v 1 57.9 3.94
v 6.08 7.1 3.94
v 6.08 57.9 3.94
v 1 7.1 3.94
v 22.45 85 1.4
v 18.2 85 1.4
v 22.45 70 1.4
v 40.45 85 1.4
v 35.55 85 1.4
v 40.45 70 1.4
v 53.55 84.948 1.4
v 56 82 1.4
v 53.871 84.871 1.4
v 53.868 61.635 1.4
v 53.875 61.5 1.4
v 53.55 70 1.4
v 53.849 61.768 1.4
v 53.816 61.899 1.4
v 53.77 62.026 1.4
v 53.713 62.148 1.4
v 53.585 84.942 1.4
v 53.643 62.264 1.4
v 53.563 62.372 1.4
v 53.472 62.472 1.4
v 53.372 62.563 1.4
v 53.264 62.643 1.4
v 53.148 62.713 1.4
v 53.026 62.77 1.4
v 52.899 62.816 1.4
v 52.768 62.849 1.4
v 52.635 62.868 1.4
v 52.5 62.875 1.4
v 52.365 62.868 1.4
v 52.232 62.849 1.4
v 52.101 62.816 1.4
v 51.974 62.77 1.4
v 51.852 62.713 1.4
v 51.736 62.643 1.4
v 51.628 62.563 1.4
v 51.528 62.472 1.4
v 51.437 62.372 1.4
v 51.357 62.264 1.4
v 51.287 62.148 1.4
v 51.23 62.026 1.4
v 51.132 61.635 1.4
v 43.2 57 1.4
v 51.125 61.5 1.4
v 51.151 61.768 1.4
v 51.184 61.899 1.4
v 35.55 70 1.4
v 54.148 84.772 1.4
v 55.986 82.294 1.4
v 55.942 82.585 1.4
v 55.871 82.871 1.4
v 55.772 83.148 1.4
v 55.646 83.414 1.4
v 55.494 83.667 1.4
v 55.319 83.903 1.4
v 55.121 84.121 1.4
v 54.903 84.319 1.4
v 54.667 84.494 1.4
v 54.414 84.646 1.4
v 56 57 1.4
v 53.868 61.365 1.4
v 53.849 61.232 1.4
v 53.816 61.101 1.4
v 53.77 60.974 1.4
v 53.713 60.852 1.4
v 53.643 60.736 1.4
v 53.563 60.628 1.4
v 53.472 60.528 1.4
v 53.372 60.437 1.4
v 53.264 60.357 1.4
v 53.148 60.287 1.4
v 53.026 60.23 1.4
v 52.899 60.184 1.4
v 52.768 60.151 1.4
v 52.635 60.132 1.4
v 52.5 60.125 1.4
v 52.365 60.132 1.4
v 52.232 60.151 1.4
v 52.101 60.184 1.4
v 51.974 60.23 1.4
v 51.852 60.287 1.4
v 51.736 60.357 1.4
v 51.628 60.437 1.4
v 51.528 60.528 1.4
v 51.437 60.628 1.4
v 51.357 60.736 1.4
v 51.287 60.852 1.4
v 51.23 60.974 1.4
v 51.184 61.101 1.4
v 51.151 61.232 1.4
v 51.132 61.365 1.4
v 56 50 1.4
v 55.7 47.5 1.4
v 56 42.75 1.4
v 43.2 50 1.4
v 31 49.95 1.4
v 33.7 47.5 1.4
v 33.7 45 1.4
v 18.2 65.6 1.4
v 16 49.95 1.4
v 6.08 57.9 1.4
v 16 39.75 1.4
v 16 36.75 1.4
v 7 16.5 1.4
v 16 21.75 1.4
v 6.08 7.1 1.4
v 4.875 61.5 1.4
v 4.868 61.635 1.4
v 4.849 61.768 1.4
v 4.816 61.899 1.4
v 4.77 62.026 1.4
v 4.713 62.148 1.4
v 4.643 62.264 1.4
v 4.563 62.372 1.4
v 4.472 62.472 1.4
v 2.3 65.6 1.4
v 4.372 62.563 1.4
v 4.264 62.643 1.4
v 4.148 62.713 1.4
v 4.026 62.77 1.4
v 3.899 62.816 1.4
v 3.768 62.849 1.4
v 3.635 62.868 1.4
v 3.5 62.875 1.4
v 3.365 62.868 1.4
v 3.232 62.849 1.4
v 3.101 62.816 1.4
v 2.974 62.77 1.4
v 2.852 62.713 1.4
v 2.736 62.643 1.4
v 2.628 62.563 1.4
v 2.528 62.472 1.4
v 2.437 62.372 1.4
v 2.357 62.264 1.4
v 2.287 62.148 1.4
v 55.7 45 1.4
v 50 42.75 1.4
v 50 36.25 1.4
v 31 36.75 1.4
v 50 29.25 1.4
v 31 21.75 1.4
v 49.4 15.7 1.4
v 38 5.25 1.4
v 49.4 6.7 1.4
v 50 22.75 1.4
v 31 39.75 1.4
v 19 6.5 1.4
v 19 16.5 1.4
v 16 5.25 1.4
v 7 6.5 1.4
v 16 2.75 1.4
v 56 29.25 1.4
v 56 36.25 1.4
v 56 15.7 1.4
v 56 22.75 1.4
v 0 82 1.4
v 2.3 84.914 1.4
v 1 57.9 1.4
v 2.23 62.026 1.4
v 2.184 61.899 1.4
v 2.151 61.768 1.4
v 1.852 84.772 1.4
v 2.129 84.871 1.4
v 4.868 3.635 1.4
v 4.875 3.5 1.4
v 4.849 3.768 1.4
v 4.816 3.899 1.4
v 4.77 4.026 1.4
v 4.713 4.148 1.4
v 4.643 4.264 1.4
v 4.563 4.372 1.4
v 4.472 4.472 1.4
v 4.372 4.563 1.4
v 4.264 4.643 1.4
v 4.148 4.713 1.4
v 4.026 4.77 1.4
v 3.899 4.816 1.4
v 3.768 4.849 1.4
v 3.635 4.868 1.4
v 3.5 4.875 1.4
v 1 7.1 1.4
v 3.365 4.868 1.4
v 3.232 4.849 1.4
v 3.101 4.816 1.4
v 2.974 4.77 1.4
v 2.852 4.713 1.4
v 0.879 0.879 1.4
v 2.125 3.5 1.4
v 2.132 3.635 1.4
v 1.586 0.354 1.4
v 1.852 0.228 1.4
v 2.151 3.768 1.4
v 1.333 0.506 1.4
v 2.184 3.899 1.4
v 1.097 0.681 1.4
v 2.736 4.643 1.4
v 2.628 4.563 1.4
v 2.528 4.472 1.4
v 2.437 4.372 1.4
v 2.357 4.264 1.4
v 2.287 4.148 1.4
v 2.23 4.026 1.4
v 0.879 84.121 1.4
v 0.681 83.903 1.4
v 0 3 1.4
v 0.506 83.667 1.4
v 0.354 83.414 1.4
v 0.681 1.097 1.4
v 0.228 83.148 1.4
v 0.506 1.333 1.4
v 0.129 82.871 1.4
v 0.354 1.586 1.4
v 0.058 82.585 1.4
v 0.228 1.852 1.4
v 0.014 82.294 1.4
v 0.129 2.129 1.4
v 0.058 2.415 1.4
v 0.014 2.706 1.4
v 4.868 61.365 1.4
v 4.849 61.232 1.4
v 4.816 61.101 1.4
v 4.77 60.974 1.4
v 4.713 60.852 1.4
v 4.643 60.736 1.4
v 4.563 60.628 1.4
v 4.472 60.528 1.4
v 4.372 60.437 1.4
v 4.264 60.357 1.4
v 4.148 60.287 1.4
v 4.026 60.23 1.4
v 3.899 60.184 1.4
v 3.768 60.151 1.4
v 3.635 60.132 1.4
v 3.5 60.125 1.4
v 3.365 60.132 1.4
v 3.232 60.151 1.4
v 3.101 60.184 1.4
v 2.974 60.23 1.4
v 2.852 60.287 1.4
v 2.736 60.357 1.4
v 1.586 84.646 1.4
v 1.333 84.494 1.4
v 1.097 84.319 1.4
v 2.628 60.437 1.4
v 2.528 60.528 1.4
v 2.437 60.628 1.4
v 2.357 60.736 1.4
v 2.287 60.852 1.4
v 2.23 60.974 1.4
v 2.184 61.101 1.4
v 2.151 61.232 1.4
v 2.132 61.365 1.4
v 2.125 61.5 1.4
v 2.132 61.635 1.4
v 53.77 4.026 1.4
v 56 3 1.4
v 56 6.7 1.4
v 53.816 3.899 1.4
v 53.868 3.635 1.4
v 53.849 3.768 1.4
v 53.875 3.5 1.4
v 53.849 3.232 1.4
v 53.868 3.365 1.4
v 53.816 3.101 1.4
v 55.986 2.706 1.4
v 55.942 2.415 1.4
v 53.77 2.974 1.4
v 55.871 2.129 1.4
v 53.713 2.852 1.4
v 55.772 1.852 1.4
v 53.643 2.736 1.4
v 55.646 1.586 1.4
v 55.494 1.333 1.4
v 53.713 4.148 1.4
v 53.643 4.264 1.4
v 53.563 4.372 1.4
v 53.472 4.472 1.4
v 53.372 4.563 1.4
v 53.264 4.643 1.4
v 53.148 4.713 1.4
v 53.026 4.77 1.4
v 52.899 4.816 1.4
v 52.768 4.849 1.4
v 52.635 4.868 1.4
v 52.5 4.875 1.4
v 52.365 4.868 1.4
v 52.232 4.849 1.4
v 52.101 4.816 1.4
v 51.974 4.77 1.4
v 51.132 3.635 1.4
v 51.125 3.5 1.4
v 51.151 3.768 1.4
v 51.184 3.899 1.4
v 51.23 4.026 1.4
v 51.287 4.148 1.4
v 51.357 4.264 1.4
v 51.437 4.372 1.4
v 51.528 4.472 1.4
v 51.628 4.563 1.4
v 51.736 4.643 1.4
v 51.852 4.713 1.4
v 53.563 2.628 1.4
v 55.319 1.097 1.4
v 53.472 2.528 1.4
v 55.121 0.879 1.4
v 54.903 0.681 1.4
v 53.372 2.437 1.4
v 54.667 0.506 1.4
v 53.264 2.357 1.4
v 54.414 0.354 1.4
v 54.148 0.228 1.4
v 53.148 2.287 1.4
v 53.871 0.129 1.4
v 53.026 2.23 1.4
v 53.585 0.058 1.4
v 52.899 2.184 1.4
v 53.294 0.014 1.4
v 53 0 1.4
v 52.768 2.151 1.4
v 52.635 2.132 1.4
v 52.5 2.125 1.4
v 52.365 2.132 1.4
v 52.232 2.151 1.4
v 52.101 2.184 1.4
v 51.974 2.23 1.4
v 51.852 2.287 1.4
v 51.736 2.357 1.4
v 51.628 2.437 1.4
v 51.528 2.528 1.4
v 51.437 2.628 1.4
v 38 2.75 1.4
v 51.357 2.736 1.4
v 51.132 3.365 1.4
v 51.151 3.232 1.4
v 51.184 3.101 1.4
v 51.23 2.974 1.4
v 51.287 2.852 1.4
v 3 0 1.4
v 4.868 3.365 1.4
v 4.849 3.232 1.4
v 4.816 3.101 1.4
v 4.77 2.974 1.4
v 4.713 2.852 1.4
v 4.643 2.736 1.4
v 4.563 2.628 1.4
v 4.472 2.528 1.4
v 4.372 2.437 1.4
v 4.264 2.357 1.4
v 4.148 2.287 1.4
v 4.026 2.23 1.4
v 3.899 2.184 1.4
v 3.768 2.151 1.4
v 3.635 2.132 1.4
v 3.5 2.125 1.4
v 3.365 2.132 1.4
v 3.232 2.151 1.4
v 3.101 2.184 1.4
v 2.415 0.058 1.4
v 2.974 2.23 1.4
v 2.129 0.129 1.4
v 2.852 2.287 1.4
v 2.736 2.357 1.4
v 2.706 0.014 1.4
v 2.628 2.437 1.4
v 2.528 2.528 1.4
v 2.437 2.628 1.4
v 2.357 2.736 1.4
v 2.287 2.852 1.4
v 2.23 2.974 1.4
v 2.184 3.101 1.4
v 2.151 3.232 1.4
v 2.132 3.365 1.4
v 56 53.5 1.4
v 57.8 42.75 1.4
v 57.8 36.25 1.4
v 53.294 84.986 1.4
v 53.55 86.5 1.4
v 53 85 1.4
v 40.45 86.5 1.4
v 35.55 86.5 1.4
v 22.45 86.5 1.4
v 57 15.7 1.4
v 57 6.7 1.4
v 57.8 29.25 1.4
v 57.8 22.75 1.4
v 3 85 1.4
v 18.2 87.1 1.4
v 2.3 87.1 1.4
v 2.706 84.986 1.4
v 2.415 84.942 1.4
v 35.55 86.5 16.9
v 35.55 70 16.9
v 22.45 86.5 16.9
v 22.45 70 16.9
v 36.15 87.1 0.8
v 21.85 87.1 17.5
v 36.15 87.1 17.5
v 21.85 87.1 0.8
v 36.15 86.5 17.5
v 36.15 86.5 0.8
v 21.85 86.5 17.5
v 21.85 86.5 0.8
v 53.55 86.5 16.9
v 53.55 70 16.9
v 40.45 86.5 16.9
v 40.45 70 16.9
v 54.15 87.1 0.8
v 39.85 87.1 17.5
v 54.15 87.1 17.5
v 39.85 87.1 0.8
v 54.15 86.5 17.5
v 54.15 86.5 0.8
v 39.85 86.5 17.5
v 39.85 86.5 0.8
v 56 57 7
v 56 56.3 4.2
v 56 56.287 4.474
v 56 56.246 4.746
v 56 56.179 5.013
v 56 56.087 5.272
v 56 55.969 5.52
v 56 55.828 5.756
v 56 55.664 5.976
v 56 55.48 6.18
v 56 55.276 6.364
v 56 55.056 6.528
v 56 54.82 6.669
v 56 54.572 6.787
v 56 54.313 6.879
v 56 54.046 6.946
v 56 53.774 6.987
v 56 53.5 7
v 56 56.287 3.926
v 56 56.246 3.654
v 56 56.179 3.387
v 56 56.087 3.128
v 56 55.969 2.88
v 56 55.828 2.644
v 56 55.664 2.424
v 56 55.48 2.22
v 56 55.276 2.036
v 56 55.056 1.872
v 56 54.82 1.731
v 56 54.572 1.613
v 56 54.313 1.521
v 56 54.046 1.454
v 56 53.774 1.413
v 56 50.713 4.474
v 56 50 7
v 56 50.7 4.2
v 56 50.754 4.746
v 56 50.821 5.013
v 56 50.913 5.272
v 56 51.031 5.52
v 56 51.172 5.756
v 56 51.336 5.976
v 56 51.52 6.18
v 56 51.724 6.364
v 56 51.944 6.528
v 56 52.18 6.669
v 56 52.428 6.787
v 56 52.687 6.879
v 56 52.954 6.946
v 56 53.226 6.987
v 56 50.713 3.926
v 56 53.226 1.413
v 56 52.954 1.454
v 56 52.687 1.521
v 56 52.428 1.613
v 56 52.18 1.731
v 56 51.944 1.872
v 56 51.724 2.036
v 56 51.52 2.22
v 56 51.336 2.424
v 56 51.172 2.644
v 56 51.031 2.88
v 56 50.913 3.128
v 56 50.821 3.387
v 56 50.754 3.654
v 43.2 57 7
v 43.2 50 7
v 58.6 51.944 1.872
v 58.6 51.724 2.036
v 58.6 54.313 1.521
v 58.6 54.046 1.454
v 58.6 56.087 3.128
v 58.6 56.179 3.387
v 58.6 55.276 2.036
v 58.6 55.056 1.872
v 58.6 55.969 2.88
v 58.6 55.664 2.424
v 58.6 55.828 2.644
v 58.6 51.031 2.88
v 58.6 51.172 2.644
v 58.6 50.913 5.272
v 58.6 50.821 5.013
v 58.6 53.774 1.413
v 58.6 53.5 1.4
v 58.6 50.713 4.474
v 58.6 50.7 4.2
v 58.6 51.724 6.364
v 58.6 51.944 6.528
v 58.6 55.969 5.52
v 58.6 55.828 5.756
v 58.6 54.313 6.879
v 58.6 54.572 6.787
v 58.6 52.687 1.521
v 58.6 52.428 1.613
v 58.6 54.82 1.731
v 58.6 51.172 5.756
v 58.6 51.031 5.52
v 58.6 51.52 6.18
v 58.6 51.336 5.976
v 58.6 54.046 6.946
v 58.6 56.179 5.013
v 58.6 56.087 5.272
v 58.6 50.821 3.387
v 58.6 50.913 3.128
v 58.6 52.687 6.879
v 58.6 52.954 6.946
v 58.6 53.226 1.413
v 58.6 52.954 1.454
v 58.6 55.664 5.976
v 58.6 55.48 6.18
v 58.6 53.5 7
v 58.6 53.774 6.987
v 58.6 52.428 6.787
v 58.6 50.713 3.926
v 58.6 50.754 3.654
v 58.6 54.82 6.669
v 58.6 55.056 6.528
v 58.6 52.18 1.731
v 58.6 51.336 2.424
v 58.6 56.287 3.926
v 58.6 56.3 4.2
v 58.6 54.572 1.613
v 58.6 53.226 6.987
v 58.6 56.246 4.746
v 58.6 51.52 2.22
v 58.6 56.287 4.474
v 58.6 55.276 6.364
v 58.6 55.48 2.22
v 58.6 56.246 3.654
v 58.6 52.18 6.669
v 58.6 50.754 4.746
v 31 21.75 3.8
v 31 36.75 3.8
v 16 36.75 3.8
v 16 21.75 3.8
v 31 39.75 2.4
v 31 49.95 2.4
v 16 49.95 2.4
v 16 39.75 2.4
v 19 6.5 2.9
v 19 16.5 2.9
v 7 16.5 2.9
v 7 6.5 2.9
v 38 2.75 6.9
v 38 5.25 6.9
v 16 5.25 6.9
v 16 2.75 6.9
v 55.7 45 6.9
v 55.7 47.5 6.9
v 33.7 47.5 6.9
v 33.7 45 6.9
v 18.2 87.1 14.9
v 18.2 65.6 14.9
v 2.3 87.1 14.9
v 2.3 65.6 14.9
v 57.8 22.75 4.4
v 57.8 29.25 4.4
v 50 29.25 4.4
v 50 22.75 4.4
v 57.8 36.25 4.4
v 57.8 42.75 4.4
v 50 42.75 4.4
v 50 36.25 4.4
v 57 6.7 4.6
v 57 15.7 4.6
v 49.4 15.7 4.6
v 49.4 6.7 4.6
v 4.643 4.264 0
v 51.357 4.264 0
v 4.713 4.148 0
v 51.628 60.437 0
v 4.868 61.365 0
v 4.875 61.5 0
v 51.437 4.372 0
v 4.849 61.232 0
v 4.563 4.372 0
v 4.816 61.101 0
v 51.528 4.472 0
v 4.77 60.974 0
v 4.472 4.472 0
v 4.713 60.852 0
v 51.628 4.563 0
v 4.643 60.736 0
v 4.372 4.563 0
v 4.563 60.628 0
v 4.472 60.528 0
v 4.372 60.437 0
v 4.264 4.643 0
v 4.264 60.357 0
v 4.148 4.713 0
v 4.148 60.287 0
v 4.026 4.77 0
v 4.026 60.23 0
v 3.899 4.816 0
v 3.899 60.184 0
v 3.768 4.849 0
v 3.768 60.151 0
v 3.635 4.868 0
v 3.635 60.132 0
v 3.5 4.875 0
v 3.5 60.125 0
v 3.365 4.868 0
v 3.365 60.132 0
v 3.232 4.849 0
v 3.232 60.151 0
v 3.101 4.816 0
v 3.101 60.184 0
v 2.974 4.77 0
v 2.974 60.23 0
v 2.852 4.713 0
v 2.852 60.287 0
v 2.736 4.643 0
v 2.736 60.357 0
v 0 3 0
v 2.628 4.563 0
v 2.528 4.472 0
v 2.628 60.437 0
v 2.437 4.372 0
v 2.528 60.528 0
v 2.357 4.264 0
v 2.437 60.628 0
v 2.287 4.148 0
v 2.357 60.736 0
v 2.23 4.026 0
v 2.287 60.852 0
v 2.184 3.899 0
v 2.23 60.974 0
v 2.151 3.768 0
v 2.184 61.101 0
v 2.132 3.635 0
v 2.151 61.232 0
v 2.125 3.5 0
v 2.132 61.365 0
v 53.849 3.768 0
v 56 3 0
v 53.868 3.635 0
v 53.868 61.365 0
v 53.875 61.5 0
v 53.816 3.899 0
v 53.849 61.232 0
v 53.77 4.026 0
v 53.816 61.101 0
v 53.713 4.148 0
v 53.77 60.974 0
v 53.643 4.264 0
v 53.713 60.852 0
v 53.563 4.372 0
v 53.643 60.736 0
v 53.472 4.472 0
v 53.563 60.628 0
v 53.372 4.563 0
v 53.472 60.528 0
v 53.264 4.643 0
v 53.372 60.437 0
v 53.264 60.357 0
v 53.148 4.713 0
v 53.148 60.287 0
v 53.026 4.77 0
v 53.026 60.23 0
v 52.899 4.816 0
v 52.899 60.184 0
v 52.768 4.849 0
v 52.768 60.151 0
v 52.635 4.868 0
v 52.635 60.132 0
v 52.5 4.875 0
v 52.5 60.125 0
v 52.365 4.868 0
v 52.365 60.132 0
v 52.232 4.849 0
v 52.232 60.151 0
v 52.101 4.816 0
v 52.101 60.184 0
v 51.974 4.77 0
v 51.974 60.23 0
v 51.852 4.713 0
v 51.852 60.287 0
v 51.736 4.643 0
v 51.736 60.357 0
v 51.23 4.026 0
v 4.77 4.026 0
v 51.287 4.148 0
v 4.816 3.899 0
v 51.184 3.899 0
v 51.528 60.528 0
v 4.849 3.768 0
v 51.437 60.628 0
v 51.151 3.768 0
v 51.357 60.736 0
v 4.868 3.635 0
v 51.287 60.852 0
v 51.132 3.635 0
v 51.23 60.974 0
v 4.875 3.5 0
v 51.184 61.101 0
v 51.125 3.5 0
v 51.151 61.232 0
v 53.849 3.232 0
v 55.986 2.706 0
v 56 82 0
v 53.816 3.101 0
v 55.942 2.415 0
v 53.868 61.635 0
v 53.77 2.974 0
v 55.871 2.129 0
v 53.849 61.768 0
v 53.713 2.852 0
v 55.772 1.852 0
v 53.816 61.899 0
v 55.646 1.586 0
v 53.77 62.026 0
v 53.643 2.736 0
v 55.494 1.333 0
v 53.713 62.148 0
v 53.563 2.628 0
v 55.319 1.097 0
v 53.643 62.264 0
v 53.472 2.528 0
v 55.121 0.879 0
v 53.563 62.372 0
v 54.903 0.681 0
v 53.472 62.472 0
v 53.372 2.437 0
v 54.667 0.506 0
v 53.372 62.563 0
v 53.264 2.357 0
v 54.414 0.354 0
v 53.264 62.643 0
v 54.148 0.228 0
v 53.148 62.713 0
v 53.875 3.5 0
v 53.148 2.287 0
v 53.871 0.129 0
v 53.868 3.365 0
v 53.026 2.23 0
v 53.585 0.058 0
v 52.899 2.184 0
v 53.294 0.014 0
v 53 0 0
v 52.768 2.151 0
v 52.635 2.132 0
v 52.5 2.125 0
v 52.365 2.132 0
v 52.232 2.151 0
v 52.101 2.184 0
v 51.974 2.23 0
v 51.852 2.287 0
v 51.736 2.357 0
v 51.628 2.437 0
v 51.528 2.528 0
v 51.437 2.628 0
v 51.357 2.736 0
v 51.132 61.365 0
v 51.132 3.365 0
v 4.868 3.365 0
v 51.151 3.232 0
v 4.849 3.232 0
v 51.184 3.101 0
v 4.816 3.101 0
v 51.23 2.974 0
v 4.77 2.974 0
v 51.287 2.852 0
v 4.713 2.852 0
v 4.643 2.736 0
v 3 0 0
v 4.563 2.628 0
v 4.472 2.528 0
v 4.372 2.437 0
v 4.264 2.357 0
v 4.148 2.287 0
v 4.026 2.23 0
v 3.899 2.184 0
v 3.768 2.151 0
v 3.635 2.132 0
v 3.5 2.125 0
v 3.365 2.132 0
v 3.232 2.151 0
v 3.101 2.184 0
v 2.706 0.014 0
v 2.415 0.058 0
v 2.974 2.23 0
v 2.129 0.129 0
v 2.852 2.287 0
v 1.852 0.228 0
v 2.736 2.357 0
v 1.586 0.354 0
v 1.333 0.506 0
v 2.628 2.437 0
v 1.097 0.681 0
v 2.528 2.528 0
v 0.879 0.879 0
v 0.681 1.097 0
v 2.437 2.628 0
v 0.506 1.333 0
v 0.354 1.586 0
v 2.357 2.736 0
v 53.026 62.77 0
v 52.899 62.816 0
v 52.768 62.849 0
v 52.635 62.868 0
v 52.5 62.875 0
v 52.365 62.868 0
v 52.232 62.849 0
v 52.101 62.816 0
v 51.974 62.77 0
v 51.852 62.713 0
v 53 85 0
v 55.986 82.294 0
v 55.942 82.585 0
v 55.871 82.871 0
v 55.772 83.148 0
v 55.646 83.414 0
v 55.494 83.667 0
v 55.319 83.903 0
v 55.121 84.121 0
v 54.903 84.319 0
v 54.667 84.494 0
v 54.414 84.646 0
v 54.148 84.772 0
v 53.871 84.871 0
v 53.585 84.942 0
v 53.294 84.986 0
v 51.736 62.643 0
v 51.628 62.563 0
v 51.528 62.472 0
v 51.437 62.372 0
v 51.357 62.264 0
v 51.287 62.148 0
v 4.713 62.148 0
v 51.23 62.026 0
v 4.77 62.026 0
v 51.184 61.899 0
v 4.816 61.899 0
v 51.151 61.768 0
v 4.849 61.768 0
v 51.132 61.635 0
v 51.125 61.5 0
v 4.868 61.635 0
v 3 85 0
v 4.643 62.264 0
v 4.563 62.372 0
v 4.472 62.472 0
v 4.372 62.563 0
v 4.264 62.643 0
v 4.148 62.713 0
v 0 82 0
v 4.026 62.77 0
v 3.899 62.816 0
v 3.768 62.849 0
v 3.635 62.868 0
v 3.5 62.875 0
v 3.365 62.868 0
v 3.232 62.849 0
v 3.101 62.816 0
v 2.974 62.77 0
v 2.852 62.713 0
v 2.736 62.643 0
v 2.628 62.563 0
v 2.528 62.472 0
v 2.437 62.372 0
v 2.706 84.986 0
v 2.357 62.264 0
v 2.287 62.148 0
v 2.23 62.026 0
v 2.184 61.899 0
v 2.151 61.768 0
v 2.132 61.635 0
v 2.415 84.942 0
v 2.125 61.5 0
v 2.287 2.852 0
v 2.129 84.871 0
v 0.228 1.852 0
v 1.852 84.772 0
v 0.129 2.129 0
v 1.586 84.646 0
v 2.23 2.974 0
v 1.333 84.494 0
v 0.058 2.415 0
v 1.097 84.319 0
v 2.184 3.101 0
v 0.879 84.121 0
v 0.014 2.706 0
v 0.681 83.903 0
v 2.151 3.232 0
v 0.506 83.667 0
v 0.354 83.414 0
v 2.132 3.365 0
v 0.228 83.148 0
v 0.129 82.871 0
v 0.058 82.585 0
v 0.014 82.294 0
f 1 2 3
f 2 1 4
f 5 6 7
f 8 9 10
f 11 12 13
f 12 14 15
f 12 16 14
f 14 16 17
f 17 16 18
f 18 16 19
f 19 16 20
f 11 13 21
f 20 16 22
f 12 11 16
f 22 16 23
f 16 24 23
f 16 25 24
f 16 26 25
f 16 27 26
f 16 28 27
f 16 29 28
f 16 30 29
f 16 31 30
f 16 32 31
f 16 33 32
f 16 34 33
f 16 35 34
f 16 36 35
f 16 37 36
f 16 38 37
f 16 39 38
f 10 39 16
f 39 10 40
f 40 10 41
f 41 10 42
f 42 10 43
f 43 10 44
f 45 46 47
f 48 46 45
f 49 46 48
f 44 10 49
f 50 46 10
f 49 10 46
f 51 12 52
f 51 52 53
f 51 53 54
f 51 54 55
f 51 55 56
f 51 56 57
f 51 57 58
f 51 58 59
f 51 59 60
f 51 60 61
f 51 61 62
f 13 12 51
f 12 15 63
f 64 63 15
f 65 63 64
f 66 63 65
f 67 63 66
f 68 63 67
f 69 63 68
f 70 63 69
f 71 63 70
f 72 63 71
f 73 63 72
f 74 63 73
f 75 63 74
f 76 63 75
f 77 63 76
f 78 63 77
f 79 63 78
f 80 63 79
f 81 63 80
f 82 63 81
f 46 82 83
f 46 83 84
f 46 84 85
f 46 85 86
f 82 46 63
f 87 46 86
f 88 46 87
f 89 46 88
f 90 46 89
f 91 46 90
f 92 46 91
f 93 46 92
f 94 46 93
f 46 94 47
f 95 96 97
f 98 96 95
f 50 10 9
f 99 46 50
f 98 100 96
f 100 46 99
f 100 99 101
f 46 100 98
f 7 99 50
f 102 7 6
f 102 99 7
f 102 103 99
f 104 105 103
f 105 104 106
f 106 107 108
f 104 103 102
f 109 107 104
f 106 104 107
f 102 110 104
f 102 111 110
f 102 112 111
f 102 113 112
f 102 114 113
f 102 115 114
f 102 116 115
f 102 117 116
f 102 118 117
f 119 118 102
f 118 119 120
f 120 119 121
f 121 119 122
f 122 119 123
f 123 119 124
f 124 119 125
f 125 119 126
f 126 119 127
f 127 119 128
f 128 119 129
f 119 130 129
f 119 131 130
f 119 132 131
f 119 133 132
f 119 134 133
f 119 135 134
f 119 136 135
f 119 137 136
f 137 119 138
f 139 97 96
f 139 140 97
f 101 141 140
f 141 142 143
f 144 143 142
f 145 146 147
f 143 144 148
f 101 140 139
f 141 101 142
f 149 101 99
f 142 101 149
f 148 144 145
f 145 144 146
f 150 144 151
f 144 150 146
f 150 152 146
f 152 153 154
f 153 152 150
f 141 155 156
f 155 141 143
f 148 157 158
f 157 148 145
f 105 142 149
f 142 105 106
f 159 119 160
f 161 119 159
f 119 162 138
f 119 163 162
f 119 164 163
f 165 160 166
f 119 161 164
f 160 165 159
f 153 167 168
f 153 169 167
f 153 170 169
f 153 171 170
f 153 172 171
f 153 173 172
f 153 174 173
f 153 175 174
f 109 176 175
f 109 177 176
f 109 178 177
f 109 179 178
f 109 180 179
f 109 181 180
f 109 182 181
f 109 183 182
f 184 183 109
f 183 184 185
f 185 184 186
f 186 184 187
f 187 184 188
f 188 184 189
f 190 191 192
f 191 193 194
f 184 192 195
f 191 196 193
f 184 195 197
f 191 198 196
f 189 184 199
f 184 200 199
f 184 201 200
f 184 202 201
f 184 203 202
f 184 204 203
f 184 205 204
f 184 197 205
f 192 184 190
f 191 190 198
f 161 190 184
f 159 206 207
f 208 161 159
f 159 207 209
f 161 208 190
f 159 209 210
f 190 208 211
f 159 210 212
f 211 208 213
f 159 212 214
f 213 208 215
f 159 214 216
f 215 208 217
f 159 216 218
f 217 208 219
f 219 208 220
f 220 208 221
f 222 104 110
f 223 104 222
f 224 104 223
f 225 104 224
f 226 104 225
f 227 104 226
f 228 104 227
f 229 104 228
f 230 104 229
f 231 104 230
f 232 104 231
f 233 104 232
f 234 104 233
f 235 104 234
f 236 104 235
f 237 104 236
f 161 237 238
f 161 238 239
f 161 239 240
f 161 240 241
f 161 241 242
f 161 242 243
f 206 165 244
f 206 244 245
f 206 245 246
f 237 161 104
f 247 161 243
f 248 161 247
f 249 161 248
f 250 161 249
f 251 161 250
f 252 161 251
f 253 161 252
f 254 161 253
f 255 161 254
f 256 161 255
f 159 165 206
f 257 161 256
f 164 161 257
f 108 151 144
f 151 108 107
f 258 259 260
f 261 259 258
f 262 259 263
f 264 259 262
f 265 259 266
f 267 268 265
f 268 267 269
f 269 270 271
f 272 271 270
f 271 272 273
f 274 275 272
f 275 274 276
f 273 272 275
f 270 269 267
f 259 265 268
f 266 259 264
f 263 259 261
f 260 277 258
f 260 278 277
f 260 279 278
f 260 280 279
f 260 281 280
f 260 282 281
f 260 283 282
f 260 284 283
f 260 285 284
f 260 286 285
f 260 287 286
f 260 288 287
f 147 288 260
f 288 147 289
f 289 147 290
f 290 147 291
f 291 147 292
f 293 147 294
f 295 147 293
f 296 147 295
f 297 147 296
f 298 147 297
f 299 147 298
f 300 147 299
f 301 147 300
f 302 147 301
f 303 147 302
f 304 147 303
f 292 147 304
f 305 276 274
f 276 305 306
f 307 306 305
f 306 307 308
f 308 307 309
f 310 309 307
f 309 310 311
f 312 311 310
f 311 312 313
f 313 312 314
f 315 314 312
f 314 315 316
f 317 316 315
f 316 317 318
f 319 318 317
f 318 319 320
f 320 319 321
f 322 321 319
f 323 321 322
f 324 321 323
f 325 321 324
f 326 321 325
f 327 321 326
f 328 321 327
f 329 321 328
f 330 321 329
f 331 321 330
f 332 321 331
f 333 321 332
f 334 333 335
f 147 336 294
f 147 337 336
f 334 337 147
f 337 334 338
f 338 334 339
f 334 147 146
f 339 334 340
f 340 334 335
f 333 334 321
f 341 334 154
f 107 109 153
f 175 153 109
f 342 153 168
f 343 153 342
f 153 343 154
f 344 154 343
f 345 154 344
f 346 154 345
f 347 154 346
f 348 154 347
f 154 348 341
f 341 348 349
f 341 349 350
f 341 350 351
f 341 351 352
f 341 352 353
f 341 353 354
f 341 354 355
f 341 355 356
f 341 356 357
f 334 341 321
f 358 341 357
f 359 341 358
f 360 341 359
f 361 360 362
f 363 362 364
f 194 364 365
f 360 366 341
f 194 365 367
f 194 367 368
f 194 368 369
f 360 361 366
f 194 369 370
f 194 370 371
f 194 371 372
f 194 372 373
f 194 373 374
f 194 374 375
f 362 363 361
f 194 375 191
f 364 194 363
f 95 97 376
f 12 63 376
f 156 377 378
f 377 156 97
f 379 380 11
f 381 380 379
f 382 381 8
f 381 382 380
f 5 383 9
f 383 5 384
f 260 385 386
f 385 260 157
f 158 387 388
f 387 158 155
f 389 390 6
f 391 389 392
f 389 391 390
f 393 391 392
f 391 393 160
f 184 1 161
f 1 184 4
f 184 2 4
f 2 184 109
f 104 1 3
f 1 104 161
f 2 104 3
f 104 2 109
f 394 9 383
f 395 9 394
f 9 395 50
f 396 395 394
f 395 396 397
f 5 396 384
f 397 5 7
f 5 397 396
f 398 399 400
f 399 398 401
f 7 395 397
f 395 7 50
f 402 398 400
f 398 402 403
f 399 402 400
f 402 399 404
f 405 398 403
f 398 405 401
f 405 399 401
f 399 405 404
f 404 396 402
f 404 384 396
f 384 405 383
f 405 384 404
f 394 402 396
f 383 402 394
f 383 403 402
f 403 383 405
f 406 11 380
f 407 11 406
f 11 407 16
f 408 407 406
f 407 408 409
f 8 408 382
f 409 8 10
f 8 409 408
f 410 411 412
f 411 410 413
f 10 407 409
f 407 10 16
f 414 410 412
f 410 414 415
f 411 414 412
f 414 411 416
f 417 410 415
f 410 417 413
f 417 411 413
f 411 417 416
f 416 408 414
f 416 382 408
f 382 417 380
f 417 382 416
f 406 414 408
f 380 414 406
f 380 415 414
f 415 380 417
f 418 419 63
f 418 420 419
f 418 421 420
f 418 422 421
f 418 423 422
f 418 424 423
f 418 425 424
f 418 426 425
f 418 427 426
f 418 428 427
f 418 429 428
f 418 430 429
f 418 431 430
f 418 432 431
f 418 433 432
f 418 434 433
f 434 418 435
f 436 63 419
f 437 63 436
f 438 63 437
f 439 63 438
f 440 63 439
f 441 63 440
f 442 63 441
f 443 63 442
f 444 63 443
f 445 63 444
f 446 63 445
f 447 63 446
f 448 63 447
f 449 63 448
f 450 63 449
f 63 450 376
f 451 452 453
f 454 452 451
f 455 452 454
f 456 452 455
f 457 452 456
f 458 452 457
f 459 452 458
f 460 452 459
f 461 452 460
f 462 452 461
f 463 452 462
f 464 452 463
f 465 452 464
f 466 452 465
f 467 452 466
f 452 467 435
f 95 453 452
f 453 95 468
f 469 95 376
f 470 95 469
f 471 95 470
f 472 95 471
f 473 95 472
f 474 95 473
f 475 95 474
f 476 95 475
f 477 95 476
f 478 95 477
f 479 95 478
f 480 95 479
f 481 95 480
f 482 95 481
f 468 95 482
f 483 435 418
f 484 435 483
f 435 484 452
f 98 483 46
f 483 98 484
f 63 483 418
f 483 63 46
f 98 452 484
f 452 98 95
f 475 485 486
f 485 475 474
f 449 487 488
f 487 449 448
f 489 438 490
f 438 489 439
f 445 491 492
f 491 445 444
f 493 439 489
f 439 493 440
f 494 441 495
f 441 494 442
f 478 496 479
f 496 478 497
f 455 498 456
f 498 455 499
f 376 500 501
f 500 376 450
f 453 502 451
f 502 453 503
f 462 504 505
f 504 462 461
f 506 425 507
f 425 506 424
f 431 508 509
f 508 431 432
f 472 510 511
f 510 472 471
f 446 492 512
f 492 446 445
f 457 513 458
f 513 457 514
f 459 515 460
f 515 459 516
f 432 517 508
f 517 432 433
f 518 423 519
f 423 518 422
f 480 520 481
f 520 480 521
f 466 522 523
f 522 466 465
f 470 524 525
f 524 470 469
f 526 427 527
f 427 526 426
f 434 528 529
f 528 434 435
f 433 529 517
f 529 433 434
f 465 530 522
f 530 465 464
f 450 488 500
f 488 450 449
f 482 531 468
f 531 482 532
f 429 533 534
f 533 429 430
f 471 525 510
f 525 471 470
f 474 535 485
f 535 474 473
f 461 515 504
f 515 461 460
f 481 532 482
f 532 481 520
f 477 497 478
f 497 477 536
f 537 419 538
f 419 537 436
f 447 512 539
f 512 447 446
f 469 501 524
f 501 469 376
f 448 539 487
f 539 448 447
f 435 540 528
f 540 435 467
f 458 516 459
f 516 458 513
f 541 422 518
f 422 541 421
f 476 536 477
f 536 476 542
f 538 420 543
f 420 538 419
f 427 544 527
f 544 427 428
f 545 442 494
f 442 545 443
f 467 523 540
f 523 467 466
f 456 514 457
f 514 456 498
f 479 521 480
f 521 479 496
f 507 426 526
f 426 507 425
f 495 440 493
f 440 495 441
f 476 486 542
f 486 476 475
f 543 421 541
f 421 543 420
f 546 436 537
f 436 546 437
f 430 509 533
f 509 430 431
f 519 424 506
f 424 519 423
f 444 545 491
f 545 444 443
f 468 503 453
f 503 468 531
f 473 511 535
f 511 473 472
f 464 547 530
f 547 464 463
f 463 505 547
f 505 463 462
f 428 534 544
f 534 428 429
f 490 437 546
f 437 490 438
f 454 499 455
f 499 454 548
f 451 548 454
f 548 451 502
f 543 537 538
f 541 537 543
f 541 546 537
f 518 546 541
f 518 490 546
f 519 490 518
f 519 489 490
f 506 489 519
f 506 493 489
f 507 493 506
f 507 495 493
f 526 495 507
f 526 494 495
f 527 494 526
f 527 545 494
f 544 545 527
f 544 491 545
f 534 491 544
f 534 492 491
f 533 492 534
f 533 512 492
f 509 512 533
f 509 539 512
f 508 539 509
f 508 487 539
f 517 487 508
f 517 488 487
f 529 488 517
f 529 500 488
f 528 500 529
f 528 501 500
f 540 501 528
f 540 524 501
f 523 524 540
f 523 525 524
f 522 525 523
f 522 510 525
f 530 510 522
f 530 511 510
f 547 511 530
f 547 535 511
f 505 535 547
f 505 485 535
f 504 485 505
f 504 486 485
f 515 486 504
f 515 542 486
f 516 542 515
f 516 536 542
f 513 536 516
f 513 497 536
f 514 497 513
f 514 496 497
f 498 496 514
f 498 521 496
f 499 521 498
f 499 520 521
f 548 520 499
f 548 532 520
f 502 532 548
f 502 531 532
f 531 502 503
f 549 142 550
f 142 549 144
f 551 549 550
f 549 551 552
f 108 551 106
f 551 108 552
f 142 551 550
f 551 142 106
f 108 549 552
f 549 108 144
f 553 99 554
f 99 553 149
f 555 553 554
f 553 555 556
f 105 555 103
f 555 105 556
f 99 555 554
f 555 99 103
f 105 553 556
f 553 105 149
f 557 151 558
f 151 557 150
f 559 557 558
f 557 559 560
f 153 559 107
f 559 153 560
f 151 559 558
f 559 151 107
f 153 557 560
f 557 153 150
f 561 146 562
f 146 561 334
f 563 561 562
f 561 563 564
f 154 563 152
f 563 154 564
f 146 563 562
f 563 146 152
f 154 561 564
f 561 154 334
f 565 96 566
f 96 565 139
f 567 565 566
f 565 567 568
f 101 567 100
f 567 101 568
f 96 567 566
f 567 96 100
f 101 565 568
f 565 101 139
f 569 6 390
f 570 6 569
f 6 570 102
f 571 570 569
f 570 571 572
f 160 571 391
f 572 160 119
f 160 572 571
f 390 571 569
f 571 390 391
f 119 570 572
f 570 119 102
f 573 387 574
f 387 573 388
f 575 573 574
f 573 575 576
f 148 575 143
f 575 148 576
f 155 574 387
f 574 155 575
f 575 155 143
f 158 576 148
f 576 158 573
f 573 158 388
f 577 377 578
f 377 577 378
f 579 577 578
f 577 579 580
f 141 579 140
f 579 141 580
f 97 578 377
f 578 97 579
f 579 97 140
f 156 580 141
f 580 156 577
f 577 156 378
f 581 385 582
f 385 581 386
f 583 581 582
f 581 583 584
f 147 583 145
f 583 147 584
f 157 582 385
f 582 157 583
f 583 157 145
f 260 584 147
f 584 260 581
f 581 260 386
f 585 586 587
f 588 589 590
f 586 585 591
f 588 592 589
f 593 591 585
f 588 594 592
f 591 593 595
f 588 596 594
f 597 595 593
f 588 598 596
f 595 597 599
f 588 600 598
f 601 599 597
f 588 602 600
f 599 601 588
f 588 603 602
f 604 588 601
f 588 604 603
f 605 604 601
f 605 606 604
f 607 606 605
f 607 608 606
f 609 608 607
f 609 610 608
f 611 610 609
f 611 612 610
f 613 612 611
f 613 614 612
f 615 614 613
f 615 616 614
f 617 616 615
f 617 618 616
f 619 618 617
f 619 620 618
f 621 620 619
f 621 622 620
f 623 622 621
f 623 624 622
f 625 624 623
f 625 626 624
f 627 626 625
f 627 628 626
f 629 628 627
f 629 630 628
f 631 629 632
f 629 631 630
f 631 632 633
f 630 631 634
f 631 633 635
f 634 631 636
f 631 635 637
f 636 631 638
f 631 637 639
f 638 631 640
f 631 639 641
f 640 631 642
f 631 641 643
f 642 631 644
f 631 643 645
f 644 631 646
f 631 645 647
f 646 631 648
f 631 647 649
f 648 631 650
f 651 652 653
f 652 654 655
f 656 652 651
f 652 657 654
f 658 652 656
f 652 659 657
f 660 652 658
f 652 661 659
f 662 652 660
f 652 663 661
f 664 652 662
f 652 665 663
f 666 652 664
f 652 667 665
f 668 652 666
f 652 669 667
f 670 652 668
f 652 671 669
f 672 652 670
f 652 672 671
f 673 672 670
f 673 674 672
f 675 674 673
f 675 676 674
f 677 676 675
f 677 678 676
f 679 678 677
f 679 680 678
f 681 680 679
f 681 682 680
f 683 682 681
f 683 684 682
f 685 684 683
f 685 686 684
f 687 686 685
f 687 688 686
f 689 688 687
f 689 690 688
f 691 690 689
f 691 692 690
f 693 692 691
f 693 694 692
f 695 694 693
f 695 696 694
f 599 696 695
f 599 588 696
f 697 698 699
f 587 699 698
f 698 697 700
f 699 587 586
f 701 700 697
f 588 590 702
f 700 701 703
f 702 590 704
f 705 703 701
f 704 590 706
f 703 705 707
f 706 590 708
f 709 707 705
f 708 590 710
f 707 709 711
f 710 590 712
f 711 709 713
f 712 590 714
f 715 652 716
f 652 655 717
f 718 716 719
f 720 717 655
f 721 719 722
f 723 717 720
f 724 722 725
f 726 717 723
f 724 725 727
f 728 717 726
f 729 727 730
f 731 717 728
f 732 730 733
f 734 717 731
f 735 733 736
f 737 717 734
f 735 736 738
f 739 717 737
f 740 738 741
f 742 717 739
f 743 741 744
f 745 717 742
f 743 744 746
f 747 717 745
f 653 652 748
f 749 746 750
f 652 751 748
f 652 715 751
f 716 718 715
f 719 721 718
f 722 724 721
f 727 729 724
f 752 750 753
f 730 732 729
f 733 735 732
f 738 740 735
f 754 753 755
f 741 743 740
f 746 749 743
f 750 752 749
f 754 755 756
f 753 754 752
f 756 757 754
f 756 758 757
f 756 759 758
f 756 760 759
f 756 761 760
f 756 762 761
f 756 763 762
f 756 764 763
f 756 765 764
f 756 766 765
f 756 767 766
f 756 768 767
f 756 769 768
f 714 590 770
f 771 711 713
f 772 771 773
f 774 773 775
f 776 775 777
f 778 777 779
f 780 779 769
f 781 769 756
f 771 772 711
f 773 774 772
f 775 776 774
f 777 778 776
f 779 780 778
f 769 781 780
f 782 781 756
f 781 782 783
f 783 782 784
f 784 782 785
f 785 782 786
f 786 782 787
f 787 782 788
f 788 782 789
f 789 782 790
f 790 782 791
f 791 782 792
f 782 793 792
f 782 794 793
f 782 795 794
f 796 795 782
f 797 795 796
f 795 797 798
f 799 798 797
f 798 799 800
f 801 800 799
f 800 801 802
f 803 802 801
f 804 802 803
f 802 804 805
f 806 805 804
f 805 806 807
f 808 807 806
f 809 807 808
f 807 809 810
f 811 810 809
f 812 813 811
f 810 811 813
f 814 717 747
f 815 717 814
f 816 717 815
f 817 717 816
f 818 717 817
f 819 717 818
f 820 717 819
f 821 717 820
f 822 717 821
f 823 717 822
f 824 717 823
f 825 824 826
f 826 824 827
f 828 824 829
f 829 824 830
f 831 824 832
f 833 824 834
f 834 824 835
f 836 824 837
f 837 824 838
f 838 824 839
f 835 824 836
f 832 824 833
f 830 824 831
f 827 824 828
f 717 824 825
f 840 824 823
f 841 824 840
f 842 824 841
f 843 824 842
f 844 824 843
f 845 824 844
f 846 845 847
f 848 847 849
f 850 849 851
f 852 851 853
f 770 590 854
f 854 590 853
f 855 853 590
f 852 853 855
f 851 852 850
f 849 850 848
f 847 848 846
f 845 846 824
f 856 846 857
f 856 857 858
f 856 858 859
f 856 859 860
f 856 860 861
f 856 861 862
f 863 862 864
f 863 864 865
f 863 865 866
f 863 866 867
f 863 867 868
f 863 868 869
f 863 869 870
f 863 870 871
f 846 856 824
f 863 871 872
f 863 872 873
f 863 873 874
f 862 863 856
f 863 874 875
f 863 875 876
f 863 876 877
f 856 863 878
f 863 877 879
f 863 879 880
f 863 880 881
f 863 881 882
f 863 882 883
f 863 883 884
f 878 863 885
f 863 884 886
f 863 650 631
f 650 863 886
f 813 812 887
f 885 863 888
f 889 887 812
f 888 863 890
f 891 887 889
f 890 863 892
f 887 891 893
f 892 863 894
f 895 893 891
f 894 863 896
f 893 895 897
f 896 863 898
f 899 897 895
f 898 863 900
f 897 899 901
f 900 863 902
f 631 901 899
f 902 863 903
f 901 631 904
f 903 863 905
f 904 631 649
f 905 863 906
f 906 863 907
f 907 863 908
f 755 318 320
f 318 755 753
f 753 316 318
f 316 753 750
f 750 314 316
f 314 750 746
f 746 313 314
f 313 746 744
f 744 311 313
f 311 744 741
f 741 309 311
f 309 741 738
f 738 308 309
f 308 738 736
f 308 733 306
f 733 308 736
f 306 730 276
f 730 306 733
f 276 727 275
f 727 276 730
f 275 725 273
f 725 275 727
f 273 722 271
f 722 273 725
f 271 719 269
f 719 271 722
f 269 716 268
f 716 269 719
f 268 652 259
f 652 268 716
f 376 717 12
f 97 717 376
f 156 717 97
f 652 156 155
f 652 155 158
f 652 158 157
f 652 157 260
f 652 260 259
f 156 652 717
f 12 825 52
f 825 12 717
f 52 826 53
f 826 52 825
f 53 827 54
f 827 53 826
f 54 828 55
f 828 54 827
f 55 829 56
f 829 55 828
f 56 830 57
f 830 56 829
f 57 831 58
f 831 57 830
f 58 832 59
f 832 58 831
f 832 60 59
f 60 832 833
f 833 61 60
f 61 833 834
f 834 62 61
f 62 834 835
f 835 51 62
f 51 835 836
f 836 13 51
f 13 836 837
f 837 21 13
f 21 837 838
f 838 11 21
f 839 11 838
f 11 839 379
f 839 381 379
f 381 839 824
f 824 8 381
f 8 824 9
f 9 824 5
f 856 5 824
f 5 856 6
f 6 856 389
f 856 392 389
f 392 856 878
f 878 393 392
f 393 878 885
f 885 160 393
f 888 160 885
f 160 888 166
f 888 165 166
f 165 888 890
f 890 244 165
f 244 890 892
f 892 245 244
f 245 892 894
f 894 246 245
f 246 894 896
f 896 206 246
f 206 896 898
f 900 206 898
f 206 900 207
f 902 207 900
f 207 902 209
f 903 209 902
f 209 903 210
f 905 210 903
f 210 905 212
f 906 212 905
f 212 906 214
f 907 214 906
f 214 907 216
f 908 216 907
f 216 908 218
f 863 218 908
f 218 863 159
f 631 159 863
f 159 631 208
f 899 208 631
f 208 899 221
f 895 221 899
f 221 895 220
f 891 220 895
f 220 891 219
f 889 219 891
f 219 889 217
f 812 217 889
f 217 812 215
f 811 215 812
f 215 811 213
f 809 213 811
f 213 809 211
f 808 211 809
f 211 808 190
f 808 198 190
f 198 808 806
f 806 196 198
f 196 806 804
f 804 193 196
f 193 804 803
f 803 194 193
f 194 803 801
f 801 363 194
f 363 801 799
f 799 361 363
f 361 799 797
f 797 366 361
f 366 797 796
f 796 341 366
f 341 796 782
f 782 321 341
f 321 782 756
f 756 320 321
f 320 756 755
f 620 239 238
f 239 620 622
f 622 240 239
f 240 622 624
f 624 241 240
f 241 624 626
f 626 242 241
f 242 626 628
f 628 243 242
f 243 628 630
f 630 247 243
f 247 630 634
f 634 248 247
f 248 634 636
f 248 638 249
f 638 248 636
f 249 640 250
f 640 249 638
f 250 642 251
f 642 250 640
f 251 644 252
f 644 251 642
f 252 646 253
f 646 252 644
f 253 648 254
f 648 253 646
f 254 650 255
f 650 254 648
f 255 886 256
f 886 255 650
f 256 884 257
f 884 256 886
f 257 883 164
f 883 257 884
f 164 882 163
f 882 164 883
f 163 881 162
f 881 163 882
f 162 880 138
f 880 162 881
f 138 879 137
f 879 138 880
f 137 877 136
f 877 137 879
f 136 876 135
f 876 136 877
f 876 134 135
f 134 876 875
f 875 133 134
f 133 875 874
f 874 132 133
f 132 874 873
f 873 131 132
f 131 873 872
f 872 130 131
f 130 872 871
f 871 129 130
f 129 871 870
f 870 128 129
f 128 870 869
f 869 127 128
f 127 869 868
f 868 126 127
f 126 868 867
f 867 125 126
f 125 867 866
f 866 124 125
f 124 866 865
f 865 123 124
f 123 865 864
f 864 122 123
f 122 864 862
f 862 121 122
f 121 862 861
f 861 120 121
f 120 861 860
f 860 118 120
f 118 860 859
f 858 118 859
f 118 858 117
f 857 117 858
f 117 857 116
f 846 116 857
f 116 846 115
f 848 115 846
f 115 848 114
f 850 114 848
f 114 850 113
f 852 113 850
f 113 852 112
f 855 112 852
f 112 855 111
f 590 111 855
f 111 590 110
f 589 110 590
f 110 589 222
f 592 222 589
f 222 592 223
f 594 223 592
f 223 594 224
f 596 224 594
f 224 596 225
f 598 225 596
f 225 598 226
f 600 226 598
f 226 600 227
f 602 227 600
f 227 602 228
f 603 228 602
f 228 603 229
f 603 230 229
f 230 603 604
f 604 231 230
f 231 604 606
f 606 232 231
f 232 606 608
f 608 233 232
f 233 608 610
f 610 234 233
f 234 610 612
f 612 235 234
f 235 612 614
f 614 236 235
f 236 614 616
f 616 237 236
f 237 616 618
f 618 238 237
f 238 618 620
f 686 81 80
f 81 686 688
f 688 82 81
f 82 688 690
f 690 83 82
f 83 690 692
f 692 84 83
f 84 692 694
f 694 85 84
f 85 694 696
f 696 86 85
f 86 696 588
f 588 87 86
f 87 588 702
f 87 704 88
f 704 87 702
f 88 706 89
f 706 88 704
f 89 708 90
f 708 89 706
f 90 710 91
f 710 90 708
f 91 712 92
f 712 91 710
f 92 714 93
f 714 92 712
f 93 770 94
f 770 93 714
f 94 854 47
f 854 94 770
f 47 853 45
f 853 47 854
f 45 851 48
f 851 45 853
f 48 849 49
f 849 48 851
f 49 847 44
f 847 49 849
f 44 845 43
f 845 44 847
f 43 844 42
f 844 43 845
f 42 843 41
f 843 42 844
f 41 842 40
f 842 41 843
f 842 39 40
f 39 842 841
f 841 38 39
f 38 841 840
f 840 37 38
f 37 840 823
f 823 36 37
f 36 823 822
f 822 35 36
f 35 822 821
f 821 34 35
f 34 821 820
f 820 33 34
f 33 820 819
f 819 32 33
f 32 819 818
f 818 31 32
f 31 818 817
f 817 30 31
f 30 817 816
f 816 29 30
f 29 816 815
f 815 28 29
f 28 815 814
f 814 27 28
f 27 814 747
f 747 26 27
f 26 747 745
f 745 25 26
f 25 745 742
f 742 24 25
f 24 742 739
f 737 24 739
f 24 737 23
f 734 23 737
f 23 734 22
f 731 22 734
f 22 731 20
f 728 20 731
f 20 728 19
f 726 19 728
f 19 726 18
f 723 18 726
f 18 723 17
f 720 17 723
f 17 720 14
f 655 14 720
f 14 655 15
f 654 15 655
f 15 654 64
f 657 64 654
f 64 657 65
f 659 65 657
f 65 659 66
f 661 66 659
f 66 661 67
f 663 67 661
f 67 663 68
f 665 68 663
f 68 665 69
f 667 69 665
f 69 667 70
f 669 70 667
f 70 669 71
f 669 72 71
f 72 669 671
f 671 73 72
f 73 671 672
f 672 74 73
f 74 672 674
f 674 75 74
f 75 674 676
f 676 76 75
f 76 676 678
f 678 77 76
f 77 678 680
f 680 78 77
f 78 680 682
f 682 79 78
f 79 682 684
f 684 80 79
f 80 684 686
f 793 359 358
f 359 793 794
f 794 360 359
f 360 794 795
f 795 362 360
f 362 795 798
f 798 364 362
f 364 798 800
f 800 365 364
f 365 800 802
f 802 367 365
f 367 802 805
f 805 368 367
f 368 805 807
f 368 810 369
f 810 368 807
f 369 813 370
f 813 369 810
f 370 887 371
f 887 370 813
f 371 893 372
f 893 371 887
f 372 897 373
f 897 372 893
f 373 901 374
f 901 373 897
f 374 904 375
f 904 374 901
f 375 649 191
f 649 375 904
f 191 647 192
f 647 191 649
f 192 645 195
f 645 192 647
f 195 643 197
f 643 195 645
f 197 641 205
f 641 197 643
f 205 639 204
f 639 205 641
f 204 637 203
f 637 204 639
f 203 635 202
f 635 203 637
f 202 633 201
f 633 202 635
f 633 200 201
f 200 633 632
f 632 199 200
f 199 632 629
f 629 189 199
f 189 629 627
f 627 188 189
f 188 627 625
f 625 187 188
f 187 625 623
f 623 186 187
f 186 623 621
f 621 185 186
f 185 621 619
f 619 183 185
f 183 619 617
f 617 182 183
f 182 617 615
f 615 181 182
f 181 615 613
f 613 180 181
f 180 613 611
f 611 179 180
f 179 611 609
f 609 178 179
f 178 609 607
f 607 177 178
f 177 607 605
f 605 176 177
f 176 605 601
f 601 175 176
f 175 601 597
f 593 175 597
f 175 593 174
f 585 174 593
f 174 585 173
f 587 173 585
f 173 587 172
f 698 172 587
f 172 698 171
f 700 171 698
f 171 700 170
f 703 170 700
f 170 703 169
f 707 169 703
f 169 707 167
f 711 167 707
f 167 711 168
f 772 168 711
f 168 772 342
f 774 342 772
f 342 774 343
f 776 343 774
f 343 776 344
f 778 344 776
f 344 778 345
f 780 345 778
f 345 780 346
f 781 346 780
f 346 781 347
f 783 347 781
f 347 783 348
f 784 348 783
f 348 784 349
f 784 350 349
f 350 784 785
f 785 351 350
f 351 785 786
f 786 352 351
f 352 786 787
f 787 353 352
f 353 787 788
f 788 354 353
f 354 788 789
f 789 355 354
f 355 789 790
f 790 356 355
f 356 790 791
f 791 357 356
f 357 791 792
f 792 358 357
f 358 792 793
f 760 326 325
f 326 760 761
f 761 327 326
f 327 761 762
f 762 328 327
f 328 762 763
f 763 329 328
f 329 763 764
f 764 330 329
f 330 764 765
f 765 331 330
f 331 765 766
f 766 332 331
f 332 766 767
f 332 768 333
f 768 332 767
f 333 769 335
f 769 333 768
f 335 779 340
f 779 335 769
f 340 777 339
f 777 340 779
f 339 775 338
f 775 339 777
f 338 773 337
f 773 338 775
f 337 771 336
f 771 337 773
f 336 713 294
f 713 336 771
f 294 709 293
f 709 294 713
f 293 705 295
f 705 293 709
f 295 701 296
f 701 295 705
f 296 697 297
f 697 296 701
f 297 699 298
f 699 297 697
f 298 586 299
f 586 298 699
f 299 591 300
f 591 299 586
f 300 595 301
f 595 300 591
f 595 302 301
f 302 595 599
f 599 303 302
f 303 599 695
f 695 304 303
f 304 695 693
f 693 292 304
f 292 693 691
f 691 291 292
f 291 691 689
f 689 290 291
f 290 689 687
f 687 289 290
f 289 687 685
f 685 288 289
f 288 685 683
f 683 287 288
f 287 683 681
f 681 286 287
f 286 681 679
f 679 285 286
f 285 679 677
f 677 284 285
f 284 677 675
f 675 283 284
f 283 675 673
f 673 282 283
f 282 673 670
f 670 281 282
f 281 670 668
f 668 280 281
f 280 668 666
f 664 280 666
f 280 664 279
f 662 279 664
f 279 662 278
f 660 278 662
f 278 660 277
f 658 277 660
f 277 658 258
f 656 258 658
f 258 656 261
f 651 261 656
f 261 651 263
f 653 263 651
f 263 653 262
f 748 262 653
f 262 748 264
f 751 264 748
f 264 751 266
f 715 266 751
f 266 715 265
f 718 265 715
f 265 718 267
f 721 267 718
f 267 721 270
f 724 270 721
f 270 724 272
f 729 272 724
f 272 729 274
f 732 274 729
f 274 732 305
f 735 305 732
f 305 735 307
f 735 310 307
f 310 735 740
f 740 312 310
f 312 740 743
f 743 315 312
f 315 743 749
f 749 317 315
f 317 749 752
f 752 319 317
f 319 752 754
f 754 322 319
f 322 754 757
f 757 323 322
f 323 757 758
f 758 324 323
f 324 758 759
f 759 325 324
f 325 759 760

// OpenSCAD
// Source: https://www.thingiverse.com/thing:4712611

//------------------------------------------------------------------------
// OpenSCAD models of miscellaneous components and devices:
// various Raspberry Pi models, SainSmart Relays, PCD8544 LCD, etc.
//
// Author:      Niccolo Rigacci <niccolo@rigacci.org>
// Version:     1.0 2017-12-14
// License:     GNU General Public License v3.0
// Modified:    by Richard Jelbert 5th January 2021 for RPi 4
//------------------------------------------------------------------------

// Interference for 3D union(), difference() and intersection();
// used to avoid the manifold problem.
interf = 0.2;

//------------------------------------------------------------------------
// Matrix of 2.54 mm pins.
//------------------------------------------------------------------------
module pin_headers(cols, rows) {
    w = 2.54; h = 2.54; p = 0.65;
    for(x = [0 : (cols -1)]) {
        for(y = [0 : (rows  - 1)]) {
            translate([w * x, w * y, 0]) {
                union() {
                    color("black") cube([w, w, h]);
                    //color("gold")  translate([(w - p) / 2, (w - p) / 2, -3]) cube([p, p, 11.54]);
                }
            }
        }
    }
}

//------------------------------------------------------------------------
// Sub-models for the Raspberry Pi 4 Model
//------------------------------------------------------------------------

module ethernet_connector(x, y, z) {
    color("silver") cube([x, y, z]);
}
module usb_connector(x, y, z) {
    f = 0.6; // Flange
    color("silver") cube([x, y, z]);
    translate([-f, y - f, -f])
        color("silver") cube([x + f * 2, f, z + f * 2]);
}
module hdmi_connector(x, y, z) {
    color("silver") cube([x, y, z]);
}
module usbc_connector(x, y, z) {
    color("silver") cube([x, y, z]);
}
module capacitor(d, h) {
    color("silver") cylinder(r=(d / 2), h=h);
}
module micro_sd_card() {
    color("silver")   translate([1.5,  0.0, -1.5]) cube([12, 12.5, 1.5]);
    color("orange") translate([2, -3.2, -1.0]) cube([11, 15, 1.0]);
}
module audio_video(size_x) {
    fn = 64;
    color([58/255, 58/255, 58/255]) {
        cube([size_x, 7, 5.6]);
        translate([size_x, 7 / 2, 5.6 / 2]) rotate([0,90,0]) cylinder(d=5.6, h=2.6, $fn = fn);
    }

}
module cpu() {
    color("silver")
    cube([15,15,2.4]);
}

module ram() {
    color("black")
    cube([15,10.2,1]);
}

module wifi(){
    color("silver")
    cube([12,10,1.5]); 
}   

module cameracon(){
    color("black")
    cube([22,2.5,5.5]);
}


//------------------------------------------------------------------------
// Raspberry Pi 4 Model B
//------------------------------------------------------------------------
module board_raspberrypi_4_model_b() {
    fn = 64;
    x  = 56;     y = 85;    z = 1.40;  // Measured PCB size
    ex = 15.9; ey = 21.5; ez = 13.5;   // Ethernet port size
    ux = 13.1; uy = 17.1; uz = 15.5;   // Measured USB connector size
    hx = 7.80; hy = 6.5; hz = 3;  // Measured micro HDMI connector size
    mx =  7.60; my =  9; mz = 3.20;  // Measured USB-C power connector size
    // The origin is the lower face of PCB.
    translate([0, 0, z]) {
        
        translate([56-32.5-7.5,3.5+25.75-7.5,0])  cpu();
        translate([56-32.5-7.5,3.5+43.75-7.5,0])  ram();
        translate([7,6.5,0])    wifi();
        translate([(56/2)-12,(4-1.25),0]) cameracon();
        translate([(56)-22.3,(45),0]) cameracon();
        translate([1.0, 7.1, 0])    pin_headers(2, 20);
        translate([x-(ex/2)-45.75, y - ey + 2.1, 0])    ethernet_connector(ex, ey, ez);
        translate([x-(ux/2)-27, 85 - uy + 2.1, 0])  usb_connector(ux, uy, uz);
        translate([x-(ux/2)-9, 85 - uy + 2.1, 0])   usb_connector(ux, uy, uz);
        translate([x - hx + 1.8, (3.5+7.7+14.8-(hy/2)), 0]) hdmi_connector(hx, hy, hz);
        translate([x - hx + 1.8, (3.5+7.7+14.8+13.5-(hy/2)), 0])    hdmi_connector(hx, hy, hz);
        translate([x - 12.8, 50, 0])    audio_video(12.8);
        translate([x - mx + 1, (3.5+7.7-(my/2)), 0])    usbc_connector(mx, my, mz);
        //translate([20.5, 0.8, -z])  micro_sd_card();
        translate([0, 0, -z]) {
            color("green") linear_extrude(height=z)
                difference() {
                    hull() {
                        translate([  3,   3]) circle(r=3, $fn = fn);
                        translate([x-3,   3]) circle(r=3, $fn = fn);
                        translate([x-3, y-3]) circle(r=3, $fn = fn);
                        translate([  3, y-3]) circle(r=3, $fn = fn);
                    }
                    raspberrypi_4_model_b_holes();
                }
        }
    }
}

//------------------------------------------------------------------------
// Holes for Raspberry Pi 4 Model B
//------------------------------------------------------------------------
module raspberrypi_4_model_b_holes() {
    x = 56;
    fn = 64;
    translate([3.5, 3.5])            circle(r=(2.75 / 2), $fn=fn);
    translate([(x - 3.5), 3.5])      circle(r=(2.75 / 2), $fn=fn);
    translate([3.5, 3.5 + 58])       circle(r=(2.75 / 2), $fn=fn);
    translate([(x - 3.5), 3.5 + 58]) circle(r=(2.75 / 2), $fn=fn);
}



board_raspberrypi_4_model_b();
